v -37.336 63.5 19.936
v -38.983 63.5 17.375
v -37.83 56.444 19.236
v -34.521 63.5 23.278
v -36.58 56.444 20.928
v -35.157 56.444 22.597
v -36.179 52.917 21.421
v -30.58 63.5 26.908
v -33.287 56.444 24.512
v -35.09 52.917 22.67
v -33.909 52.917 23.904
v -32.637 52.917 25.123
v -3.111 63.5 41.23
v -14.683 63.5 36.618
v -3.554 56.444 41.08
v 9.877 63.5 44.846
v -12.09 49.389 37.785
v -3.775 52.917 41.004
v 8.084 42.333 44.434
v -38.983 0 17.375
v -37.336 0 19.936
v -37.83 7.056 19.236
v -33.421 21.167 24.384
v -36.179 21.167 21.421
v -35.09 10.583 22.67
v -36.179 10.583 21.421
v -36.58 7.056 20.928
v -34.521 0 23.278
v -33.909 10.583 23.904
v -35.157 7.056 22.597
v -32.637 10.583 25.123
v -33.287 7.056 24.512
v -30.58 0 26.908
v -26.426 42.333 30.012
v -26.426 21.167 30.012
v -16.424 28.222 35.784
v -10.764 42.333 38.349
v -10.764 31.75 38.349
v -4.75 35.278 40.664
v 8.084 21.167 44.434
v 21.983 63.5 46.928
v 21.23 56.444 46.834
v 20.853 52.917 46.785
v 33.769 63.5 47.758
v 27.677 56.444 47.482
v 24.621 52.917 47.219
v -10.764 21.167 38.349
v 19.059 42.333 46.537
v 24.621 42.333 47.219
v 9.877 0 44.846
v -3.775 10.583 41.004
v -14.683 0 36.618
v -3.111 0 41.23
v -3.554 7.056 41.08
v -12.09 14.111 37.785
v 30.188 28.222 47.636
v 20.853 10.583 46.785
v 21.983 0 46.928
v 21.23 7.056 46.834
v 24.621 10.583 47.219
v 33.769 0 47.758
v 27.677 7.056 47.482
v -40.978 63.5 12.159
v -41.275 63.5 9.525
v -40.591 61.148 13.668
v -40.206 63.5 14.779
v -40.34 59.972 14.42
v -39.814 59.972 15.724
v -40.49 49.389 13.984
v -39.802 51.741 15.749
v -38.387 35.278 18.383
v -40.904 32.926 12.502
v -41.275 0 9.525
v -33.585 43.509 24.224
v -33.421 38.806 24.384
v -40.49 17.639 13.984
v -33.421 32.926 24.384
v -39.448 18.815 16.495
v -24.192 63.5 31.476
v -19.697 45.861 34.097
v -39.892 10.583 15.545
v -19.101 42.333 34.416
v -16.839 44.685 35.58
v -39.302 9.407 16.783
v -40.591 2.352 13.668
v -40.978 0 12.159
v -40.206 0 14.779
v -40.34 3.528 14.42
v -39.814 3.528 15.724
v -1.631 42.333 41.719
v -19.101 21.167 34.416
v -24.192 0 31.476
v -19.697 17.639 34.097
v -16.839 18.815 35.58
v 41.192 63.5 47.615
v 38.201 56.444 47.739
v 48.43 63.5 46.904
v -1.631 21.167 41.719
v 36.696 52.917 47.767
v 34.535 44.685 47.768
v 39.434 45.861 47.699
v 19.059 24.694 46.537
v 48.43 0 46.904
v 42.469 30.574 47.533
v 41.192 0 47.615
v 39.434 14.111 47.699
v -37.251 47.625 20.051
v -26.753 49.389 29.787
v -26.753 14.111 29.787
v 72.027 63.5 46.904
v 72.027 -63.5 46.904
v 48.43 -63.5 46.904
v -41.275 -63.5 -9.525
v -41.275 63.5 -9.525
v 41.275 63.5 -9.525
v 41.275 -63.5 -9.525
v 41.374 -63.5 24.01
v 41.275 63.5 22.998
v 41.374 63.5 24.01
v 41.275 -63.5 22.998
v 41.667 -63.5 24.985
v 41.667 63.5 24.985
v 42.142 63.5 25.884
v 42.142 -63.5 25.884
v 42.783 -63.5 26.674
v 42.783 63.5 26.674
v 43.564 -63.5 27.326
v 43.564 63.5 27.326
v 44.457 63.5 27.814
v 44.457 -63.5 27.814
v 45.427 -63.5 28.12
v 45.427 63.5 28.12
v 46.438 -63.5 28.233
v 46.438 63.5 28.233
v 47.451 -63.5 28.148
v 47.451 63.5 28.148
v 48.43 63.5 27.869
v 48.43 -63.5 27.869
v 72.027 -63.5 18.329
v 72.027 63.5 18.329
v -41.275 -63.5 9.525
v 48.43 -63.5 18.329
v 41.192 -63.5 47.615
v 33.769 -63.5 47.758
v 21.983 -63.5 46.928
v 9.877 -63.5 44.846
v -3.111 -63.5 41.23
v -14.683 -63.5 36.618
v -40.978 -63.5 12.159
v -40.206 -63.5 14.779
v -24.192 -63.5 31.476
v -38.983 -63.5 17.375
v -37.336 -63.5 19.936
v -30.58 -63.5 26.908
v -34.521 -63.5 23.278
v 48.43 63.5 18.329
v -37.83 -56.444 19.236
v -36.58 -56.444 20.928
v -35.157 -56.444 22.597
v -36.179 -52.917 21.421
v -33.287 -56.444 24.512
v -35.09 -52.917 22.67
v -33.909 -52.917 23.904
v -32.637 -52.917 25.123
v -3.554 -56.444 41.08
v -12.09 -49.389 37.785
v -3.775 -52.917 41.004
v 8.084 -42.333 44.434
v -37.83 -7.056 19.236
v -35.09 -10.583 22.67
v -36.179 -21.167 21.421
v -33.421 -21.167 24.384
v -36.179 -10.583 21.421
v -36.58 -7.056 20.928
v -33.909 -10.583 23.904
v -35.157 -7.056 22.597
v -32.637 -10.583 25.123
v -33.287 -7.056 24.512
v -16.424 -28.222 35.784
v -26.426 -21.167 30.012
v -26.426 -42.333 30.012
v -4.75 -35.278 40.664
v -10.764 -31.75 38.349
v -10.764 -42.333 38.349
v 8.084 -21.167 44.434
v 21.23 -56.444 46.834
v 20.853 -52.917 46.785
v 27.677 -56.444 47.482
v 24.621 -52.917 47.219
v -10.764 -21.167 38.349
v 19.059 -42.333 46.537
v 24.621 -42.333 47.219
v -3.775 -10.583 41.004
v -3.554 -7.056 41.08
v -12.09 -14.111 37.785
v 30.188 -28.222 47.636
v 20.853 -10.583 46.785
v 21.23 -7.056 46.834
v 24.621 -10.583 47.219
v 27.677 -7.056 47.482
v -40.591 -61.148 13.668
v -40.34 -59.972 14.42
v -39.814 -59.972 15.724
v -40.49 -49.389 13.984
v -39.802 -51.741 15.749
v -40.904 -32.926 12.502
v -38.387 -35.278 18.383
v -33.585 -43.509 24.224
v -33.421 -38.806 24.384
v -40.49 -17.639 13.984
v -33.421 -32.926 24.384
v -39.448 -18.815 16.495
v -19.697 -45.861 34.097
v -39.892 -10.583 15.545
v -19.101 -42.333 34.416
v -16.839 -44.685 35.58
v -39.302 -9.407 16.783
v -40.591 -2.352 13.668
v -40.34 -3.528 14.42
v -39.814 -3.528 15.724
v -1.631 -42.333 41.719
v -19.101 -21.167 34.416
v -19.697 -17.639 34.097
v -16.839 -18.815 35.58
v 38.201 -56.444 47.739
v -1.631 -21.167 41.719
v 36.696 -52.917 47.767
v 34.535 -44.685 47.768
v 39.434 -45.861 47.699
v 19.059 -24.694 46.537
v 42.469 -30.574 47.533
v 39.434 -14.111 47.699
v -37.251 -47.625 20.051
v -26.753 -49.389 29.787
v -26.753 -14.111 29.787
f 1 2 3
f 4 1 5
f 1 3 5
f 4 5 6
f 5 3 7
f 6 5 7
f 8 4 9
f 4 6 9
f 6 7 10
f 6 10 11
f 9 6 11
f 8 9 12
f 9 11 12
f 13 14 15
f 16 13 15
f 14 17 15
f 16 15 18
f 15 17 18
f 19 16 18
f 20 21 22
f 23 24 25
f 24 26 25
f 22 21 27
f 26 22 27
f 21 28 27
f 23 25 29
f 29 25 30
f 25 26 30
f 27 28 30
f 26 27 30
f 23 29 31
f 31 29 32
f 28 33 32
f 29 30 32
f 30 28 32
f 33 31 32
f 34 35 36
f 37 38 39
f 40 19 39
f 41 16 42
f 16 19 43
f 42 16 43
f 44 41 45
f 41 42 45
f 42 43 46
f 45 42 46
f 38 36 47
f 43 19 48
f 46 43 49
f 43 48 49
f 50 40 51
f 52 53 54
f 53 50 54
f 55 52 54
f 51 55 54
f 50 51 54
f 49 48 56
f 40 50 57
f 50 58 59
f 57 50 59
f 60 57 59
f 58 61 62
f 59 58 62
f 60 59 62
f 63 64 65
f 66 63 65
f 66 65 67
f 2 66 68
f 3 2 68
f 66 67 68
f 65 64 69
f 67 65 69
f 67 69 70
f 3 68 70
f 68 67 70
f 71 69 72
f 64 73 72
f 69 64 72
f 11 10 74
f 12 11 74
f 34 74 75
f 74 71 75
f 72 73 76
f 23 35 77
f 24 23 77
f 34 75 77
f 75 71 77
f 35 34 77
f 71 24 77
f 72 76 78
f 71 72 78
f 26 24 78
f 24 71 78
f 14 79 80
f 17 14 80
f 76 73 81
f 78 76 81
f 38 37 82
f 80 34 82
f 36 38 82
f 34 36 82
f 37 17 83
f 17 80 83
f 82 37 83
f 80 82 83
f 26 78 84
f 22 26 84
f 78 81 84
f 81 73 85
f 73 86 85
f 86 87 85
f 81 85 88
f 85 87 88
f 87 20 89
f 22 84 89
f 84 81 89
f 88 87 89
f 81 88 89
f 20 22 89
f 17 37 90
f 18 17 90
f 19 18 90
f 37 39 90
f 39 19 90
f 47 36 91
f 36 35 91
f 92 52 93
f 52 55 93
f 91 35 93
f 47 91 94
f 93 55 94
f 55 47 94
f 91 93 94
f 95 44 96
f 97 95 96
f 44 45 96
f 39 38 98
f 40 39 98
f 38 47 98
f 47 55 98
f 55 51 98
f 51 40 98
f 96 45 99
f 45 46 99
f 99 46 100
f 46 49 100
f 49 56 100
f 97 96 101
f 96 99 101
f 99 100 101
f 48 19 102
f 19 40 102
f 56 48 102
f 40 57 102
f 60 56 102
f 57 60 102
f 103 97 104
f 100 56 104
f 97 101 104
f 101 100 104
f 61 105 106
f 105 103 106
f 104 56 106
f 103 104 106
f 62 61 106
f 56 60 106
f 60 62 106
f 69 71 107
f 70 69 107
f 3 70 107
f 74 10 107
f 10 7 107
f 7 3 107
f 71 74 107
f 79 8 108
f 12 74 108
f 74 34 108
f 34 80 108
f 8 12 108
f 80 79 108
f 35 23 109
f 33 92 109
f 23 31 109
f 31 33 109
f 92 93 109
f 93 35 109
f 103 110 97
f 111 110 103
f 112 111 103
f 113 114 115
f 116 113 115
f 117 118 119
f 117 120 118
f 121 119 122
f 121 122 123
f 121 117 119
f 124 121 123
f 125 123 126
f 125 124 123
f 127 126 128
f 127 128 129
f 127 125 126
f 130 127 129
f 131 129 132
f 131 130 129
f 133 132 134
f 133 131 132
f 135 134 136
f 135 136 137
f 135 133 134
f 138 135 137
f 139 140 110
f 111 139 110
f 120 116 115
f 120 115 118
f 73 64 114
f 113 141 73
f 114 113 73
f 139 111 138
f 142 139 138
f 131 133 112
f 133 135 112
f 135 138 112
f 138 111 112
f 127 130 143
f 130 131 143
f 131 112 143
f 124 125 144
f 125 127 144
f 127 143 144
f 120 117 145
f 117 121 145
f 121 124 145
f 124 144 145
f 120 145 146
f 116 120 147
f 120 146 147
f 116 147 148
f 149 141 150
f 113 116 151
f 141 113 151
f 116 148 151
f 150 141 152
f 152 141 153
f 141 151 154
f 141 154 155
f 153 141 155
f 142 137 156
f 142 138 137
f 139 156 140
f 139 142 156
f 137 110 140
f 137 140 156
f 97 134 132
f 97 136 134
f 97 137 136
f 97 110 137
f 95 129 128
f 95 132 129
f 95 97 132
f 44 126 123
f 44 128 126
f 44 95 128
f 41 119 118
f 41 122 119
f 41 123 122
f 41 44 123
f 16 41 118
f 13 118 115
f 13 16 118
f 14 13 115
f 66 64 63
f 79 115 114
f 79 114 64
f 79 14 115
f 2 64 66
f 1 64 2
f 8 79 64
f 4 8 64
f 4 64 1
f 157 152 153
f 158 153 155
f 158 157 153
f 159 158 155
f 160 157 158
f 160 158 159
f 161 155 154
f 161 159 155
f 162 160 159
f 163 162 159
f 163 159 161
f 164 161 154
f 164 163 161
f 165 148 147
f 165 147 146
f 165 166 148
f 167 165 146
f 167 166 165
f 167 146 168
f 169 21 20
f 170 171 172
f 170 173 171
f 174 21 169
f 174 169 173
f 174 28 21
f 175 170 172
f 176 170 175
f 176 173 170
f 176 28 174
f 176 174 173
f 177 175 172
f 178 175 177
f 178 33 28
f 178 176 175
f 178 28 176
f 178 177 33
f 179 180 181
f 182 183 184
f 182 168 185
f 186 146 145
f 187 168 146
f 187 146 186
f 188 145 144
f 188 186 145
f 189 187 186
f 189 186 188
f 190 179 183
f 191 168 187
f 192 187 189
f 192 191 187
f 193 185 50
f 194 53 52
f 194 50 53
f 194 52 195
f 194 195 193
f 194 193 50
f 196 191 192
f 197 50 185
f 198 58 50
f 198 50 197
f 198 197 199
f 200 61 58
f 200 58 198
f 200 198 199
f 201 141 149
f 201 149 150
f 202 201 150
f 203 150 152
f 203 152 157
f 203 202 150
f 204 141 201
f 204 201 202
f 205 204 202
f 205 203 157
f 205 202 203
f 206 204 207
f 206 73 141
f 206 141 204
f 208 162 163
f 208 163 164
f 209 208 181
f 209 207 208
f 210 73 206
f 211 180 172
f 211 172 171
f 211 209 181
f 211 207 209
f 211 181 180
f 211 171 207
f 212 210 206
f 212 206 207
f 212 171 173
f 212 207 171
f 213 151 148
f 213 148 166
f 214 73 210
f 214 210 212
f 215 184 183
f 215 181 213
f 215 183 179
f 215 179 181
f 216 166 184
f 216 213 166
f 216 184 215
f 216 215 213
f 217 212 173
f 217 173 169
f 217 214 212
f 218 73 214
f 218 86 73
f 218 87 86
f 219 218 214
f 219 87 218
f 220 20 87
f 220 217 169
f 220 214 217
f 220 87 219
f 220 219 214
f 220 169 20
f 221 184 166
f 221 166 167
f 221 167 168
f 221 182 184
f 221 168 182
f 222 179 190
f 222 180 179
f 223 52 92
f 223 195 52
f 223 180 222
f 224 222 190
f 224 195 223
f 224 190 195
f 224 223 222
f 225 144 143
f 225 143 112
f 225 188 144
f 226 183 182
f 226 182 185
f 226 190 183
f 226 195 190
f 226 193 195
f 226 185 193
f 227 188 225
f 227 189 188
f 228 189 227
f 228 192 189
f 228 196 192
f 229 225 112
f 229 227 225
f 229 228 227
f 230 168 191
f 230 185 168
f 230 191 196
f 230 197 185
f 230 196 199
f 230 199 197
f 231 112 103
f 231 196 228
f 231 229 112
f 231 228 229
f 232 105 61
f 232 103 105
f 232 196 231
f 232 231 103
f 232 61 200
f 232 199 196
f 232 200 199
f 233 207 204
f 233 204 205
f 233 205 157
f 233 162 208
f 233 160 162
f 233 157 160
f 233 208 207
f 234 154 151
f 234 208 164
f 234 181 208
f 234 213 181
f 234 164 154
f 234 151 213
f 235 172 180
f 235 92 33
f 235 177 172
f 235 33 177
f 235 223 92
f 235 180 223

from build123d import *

# Parameters (mm, degrees)
F1_DEPTH = 63.5


with BuildPart() as f1:
    # F0 (on Front) → F1 (new body, symmetric)
    with BuildSketch(Plane.XZ):
        with BuildLine():
            add(Edge.make_bspline(
                [(-41.275, 9.525), (-40.863544, 31.082287), (9.773727, 52.372959), (48.429718, 46.904484)],
                knots=[0, 0, 0, 0, 97.18108, 97.18108, 97.18108, 97.18108], degree=3))
            Line((-41.275, 9.525), (25.213744, 9.525))
            Line((25.213744, 9.525), (25.213744, 22.997882))
            ThreePointArc((25.213744, 22.997882), (32.145966, 38.720956), (48.429718, 44.20823))
            Line((48.429718, 44.20823), (48.429718, 46.904484))
        make_face()
        Polygon((25.213744, 9.525), (-41.275, 9.525), (-41.275, -9.525), (41.275, -9.525), (41.275, 9.525), align=None)
        with BuildLine():
            Line((25.213744, 22.997882), (25.213744, 9.525))
            Line((25.213744, 9.525), (41.275, 9.525))
            Line((41.275, 9.525), (41.275, 22.997882))
            ThreePointArc((41.275, 22.997882), (43.564075, 27.325707), (48.429718, 27.869256))
            Line((48.429718, 27.869256), (48.429718, 44.20823))
            ThreePointArc((48.429718, 44.20823), (32.145966, 38.720956), (25.213744, 22.997882))
        make_face()
        Polygon((72.02662, 46.904484), (48.429718, 46.904484), (48.429718, 44.20823), (48.429718, 27.869256), (48.429718, 18.329484), (72.02662, 18.329484), align=None)
    extrude(amount=F1_DEPTH, both=True)


solid = f1.part
